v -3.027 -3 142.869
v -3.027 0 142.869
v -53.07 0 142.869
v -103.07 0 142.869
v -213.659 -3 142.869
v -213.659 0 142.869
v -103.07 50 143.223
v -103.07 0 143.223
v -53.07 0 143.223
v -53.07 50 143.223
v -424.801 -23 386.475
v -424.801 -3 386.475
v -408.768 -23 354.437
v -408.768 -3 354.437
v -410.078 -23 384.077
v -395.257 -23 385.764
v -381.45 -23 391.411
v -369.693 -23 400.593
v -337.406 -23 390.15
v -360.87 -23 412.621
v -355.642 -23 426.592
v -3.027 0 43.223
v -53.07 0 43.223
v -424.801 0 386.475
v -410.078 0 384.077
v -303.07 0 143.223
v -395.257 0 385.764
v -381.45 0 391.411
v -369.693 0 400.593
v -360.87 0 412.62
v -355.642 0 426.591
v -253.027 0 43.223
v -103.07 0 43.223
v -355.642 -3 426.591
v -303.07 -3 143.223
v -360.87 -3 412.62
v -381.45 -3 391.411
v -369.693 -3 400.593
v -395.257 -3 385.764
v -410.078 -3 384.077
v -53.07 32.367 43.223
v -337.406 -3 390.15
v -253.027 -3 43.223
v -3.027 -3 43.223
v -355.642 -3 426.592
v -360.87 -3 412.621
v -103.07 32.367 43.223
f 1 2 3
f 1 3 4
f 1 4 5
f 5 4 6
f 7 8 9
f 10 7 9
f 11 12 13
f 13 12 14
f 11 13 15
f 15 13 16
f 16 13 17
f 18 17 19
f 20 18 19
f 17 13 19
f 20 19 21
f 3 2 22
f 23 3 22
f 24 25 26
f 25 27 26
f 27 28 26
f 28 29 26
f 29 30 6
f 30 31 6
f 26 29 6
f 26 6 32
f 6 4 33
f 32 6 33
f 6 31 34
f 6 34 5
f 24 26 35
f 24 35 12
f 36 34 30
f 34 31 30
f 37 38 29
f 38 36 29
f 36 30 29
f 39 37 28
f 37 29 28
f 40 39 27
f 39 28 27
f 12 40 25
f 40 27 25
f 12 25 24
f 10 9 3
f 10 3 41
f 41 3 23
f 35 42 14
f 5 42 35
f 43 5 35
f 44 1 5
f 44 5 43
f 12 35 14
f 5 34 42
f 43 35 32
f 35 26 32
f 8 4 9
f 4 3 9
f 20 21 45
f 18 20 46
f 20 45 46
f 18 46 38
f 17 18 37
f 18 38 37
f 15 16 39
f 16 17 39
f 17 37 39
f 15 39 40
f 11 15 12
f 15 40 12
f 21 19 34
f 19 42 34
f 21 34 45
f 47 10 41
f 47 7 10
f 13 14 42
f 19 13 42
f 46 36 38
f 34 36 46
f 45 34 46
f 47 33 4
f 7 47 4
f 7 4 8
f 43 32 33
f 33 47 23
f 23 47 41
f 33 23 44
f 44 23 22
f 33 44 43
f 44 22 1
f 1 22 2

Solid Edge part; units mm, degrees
sketch "Sketch1" plane through (0, 0, 0) normal (0, -1, 0) x (1, 0, 0)
  line L0 (-253.0269, 43.2231) -> (-3.0269, 43.2231)
  line L1 (-3.0269, 43.2231) -> (-3.0269, 142.8693)
  line L2 (-3.0269, 142.8693) -> (-213.6588, 142.8693)
  line L3 (-355.6424, 426.5914) -> (-213.6588, 142.8693)
  arc A0 (-424.8013, 386.4753) -> (-355.6424, 426.5914) centre (-408.7684, 438.5071) ccw
  line L4 (-303.0701, 143.2231) -> (-424.8013, 386.4753)
  line L5 (-303.0701, 143.2231) -> (-253.0269, 43.2231)
  dimension "D1" = 250
extrude "Protrusion1" add sketch "Sketch1" along normal blind 3
sketch "Sketch2" plane through (-252.7601, 0, 247.3078) normal (0, 1, 0) x (-1, 0, 0)
  line L0 (-199.6901, -204.0847) -> (-149.6901, -204.0847)
  line L1 (-149.6901, -204.0847) -> (-149.6901, -104.0847)
  line L2 (-149.6901, -104.0847) -> (-199.6901, -104.0847)
  line L3 (-199.6901, -104.0847) -> (-199.6901, -204.0847)
extrude "ExtrudedProtrusion_4" add sketch "Sketch2" along normal blind 50
sketch "Sketch3" plane through (-103.0701, 25, 93.223) normal (-1, 0, 0) x (0, -1, 0)
  line L0 (-25, 50) -> (-7.3673, -50)
  line L1 (-7.3673, -50) -> (-25, -50)
  line L2 (-25, -50) -> (-25, 50)
extrude "Cutout1" cut sketch "Sketch3" against normal through all
sketch "Sketch4" plane through (-238.9357, -3, 234.9073) normal (0, -1, 0) x (1, 0, 0)
  arc A0 (-185.8656, 151.5681) -> (-116.7067, 191.6842) centre (-169.8327, 203.5998) ccw
  line L0 (-98.47, 155.2422) -> (-116.7067, 191.6842)
  line L1 (-169.8327, 119.53) -> (-98.47, 155.2422)
  line L2 (-185.8656, 151.5681) -> (-169.8327, 119.53)
extrude "ExtrudedProtrusion_5" add sketch "Sketch4" along normal blind 20
